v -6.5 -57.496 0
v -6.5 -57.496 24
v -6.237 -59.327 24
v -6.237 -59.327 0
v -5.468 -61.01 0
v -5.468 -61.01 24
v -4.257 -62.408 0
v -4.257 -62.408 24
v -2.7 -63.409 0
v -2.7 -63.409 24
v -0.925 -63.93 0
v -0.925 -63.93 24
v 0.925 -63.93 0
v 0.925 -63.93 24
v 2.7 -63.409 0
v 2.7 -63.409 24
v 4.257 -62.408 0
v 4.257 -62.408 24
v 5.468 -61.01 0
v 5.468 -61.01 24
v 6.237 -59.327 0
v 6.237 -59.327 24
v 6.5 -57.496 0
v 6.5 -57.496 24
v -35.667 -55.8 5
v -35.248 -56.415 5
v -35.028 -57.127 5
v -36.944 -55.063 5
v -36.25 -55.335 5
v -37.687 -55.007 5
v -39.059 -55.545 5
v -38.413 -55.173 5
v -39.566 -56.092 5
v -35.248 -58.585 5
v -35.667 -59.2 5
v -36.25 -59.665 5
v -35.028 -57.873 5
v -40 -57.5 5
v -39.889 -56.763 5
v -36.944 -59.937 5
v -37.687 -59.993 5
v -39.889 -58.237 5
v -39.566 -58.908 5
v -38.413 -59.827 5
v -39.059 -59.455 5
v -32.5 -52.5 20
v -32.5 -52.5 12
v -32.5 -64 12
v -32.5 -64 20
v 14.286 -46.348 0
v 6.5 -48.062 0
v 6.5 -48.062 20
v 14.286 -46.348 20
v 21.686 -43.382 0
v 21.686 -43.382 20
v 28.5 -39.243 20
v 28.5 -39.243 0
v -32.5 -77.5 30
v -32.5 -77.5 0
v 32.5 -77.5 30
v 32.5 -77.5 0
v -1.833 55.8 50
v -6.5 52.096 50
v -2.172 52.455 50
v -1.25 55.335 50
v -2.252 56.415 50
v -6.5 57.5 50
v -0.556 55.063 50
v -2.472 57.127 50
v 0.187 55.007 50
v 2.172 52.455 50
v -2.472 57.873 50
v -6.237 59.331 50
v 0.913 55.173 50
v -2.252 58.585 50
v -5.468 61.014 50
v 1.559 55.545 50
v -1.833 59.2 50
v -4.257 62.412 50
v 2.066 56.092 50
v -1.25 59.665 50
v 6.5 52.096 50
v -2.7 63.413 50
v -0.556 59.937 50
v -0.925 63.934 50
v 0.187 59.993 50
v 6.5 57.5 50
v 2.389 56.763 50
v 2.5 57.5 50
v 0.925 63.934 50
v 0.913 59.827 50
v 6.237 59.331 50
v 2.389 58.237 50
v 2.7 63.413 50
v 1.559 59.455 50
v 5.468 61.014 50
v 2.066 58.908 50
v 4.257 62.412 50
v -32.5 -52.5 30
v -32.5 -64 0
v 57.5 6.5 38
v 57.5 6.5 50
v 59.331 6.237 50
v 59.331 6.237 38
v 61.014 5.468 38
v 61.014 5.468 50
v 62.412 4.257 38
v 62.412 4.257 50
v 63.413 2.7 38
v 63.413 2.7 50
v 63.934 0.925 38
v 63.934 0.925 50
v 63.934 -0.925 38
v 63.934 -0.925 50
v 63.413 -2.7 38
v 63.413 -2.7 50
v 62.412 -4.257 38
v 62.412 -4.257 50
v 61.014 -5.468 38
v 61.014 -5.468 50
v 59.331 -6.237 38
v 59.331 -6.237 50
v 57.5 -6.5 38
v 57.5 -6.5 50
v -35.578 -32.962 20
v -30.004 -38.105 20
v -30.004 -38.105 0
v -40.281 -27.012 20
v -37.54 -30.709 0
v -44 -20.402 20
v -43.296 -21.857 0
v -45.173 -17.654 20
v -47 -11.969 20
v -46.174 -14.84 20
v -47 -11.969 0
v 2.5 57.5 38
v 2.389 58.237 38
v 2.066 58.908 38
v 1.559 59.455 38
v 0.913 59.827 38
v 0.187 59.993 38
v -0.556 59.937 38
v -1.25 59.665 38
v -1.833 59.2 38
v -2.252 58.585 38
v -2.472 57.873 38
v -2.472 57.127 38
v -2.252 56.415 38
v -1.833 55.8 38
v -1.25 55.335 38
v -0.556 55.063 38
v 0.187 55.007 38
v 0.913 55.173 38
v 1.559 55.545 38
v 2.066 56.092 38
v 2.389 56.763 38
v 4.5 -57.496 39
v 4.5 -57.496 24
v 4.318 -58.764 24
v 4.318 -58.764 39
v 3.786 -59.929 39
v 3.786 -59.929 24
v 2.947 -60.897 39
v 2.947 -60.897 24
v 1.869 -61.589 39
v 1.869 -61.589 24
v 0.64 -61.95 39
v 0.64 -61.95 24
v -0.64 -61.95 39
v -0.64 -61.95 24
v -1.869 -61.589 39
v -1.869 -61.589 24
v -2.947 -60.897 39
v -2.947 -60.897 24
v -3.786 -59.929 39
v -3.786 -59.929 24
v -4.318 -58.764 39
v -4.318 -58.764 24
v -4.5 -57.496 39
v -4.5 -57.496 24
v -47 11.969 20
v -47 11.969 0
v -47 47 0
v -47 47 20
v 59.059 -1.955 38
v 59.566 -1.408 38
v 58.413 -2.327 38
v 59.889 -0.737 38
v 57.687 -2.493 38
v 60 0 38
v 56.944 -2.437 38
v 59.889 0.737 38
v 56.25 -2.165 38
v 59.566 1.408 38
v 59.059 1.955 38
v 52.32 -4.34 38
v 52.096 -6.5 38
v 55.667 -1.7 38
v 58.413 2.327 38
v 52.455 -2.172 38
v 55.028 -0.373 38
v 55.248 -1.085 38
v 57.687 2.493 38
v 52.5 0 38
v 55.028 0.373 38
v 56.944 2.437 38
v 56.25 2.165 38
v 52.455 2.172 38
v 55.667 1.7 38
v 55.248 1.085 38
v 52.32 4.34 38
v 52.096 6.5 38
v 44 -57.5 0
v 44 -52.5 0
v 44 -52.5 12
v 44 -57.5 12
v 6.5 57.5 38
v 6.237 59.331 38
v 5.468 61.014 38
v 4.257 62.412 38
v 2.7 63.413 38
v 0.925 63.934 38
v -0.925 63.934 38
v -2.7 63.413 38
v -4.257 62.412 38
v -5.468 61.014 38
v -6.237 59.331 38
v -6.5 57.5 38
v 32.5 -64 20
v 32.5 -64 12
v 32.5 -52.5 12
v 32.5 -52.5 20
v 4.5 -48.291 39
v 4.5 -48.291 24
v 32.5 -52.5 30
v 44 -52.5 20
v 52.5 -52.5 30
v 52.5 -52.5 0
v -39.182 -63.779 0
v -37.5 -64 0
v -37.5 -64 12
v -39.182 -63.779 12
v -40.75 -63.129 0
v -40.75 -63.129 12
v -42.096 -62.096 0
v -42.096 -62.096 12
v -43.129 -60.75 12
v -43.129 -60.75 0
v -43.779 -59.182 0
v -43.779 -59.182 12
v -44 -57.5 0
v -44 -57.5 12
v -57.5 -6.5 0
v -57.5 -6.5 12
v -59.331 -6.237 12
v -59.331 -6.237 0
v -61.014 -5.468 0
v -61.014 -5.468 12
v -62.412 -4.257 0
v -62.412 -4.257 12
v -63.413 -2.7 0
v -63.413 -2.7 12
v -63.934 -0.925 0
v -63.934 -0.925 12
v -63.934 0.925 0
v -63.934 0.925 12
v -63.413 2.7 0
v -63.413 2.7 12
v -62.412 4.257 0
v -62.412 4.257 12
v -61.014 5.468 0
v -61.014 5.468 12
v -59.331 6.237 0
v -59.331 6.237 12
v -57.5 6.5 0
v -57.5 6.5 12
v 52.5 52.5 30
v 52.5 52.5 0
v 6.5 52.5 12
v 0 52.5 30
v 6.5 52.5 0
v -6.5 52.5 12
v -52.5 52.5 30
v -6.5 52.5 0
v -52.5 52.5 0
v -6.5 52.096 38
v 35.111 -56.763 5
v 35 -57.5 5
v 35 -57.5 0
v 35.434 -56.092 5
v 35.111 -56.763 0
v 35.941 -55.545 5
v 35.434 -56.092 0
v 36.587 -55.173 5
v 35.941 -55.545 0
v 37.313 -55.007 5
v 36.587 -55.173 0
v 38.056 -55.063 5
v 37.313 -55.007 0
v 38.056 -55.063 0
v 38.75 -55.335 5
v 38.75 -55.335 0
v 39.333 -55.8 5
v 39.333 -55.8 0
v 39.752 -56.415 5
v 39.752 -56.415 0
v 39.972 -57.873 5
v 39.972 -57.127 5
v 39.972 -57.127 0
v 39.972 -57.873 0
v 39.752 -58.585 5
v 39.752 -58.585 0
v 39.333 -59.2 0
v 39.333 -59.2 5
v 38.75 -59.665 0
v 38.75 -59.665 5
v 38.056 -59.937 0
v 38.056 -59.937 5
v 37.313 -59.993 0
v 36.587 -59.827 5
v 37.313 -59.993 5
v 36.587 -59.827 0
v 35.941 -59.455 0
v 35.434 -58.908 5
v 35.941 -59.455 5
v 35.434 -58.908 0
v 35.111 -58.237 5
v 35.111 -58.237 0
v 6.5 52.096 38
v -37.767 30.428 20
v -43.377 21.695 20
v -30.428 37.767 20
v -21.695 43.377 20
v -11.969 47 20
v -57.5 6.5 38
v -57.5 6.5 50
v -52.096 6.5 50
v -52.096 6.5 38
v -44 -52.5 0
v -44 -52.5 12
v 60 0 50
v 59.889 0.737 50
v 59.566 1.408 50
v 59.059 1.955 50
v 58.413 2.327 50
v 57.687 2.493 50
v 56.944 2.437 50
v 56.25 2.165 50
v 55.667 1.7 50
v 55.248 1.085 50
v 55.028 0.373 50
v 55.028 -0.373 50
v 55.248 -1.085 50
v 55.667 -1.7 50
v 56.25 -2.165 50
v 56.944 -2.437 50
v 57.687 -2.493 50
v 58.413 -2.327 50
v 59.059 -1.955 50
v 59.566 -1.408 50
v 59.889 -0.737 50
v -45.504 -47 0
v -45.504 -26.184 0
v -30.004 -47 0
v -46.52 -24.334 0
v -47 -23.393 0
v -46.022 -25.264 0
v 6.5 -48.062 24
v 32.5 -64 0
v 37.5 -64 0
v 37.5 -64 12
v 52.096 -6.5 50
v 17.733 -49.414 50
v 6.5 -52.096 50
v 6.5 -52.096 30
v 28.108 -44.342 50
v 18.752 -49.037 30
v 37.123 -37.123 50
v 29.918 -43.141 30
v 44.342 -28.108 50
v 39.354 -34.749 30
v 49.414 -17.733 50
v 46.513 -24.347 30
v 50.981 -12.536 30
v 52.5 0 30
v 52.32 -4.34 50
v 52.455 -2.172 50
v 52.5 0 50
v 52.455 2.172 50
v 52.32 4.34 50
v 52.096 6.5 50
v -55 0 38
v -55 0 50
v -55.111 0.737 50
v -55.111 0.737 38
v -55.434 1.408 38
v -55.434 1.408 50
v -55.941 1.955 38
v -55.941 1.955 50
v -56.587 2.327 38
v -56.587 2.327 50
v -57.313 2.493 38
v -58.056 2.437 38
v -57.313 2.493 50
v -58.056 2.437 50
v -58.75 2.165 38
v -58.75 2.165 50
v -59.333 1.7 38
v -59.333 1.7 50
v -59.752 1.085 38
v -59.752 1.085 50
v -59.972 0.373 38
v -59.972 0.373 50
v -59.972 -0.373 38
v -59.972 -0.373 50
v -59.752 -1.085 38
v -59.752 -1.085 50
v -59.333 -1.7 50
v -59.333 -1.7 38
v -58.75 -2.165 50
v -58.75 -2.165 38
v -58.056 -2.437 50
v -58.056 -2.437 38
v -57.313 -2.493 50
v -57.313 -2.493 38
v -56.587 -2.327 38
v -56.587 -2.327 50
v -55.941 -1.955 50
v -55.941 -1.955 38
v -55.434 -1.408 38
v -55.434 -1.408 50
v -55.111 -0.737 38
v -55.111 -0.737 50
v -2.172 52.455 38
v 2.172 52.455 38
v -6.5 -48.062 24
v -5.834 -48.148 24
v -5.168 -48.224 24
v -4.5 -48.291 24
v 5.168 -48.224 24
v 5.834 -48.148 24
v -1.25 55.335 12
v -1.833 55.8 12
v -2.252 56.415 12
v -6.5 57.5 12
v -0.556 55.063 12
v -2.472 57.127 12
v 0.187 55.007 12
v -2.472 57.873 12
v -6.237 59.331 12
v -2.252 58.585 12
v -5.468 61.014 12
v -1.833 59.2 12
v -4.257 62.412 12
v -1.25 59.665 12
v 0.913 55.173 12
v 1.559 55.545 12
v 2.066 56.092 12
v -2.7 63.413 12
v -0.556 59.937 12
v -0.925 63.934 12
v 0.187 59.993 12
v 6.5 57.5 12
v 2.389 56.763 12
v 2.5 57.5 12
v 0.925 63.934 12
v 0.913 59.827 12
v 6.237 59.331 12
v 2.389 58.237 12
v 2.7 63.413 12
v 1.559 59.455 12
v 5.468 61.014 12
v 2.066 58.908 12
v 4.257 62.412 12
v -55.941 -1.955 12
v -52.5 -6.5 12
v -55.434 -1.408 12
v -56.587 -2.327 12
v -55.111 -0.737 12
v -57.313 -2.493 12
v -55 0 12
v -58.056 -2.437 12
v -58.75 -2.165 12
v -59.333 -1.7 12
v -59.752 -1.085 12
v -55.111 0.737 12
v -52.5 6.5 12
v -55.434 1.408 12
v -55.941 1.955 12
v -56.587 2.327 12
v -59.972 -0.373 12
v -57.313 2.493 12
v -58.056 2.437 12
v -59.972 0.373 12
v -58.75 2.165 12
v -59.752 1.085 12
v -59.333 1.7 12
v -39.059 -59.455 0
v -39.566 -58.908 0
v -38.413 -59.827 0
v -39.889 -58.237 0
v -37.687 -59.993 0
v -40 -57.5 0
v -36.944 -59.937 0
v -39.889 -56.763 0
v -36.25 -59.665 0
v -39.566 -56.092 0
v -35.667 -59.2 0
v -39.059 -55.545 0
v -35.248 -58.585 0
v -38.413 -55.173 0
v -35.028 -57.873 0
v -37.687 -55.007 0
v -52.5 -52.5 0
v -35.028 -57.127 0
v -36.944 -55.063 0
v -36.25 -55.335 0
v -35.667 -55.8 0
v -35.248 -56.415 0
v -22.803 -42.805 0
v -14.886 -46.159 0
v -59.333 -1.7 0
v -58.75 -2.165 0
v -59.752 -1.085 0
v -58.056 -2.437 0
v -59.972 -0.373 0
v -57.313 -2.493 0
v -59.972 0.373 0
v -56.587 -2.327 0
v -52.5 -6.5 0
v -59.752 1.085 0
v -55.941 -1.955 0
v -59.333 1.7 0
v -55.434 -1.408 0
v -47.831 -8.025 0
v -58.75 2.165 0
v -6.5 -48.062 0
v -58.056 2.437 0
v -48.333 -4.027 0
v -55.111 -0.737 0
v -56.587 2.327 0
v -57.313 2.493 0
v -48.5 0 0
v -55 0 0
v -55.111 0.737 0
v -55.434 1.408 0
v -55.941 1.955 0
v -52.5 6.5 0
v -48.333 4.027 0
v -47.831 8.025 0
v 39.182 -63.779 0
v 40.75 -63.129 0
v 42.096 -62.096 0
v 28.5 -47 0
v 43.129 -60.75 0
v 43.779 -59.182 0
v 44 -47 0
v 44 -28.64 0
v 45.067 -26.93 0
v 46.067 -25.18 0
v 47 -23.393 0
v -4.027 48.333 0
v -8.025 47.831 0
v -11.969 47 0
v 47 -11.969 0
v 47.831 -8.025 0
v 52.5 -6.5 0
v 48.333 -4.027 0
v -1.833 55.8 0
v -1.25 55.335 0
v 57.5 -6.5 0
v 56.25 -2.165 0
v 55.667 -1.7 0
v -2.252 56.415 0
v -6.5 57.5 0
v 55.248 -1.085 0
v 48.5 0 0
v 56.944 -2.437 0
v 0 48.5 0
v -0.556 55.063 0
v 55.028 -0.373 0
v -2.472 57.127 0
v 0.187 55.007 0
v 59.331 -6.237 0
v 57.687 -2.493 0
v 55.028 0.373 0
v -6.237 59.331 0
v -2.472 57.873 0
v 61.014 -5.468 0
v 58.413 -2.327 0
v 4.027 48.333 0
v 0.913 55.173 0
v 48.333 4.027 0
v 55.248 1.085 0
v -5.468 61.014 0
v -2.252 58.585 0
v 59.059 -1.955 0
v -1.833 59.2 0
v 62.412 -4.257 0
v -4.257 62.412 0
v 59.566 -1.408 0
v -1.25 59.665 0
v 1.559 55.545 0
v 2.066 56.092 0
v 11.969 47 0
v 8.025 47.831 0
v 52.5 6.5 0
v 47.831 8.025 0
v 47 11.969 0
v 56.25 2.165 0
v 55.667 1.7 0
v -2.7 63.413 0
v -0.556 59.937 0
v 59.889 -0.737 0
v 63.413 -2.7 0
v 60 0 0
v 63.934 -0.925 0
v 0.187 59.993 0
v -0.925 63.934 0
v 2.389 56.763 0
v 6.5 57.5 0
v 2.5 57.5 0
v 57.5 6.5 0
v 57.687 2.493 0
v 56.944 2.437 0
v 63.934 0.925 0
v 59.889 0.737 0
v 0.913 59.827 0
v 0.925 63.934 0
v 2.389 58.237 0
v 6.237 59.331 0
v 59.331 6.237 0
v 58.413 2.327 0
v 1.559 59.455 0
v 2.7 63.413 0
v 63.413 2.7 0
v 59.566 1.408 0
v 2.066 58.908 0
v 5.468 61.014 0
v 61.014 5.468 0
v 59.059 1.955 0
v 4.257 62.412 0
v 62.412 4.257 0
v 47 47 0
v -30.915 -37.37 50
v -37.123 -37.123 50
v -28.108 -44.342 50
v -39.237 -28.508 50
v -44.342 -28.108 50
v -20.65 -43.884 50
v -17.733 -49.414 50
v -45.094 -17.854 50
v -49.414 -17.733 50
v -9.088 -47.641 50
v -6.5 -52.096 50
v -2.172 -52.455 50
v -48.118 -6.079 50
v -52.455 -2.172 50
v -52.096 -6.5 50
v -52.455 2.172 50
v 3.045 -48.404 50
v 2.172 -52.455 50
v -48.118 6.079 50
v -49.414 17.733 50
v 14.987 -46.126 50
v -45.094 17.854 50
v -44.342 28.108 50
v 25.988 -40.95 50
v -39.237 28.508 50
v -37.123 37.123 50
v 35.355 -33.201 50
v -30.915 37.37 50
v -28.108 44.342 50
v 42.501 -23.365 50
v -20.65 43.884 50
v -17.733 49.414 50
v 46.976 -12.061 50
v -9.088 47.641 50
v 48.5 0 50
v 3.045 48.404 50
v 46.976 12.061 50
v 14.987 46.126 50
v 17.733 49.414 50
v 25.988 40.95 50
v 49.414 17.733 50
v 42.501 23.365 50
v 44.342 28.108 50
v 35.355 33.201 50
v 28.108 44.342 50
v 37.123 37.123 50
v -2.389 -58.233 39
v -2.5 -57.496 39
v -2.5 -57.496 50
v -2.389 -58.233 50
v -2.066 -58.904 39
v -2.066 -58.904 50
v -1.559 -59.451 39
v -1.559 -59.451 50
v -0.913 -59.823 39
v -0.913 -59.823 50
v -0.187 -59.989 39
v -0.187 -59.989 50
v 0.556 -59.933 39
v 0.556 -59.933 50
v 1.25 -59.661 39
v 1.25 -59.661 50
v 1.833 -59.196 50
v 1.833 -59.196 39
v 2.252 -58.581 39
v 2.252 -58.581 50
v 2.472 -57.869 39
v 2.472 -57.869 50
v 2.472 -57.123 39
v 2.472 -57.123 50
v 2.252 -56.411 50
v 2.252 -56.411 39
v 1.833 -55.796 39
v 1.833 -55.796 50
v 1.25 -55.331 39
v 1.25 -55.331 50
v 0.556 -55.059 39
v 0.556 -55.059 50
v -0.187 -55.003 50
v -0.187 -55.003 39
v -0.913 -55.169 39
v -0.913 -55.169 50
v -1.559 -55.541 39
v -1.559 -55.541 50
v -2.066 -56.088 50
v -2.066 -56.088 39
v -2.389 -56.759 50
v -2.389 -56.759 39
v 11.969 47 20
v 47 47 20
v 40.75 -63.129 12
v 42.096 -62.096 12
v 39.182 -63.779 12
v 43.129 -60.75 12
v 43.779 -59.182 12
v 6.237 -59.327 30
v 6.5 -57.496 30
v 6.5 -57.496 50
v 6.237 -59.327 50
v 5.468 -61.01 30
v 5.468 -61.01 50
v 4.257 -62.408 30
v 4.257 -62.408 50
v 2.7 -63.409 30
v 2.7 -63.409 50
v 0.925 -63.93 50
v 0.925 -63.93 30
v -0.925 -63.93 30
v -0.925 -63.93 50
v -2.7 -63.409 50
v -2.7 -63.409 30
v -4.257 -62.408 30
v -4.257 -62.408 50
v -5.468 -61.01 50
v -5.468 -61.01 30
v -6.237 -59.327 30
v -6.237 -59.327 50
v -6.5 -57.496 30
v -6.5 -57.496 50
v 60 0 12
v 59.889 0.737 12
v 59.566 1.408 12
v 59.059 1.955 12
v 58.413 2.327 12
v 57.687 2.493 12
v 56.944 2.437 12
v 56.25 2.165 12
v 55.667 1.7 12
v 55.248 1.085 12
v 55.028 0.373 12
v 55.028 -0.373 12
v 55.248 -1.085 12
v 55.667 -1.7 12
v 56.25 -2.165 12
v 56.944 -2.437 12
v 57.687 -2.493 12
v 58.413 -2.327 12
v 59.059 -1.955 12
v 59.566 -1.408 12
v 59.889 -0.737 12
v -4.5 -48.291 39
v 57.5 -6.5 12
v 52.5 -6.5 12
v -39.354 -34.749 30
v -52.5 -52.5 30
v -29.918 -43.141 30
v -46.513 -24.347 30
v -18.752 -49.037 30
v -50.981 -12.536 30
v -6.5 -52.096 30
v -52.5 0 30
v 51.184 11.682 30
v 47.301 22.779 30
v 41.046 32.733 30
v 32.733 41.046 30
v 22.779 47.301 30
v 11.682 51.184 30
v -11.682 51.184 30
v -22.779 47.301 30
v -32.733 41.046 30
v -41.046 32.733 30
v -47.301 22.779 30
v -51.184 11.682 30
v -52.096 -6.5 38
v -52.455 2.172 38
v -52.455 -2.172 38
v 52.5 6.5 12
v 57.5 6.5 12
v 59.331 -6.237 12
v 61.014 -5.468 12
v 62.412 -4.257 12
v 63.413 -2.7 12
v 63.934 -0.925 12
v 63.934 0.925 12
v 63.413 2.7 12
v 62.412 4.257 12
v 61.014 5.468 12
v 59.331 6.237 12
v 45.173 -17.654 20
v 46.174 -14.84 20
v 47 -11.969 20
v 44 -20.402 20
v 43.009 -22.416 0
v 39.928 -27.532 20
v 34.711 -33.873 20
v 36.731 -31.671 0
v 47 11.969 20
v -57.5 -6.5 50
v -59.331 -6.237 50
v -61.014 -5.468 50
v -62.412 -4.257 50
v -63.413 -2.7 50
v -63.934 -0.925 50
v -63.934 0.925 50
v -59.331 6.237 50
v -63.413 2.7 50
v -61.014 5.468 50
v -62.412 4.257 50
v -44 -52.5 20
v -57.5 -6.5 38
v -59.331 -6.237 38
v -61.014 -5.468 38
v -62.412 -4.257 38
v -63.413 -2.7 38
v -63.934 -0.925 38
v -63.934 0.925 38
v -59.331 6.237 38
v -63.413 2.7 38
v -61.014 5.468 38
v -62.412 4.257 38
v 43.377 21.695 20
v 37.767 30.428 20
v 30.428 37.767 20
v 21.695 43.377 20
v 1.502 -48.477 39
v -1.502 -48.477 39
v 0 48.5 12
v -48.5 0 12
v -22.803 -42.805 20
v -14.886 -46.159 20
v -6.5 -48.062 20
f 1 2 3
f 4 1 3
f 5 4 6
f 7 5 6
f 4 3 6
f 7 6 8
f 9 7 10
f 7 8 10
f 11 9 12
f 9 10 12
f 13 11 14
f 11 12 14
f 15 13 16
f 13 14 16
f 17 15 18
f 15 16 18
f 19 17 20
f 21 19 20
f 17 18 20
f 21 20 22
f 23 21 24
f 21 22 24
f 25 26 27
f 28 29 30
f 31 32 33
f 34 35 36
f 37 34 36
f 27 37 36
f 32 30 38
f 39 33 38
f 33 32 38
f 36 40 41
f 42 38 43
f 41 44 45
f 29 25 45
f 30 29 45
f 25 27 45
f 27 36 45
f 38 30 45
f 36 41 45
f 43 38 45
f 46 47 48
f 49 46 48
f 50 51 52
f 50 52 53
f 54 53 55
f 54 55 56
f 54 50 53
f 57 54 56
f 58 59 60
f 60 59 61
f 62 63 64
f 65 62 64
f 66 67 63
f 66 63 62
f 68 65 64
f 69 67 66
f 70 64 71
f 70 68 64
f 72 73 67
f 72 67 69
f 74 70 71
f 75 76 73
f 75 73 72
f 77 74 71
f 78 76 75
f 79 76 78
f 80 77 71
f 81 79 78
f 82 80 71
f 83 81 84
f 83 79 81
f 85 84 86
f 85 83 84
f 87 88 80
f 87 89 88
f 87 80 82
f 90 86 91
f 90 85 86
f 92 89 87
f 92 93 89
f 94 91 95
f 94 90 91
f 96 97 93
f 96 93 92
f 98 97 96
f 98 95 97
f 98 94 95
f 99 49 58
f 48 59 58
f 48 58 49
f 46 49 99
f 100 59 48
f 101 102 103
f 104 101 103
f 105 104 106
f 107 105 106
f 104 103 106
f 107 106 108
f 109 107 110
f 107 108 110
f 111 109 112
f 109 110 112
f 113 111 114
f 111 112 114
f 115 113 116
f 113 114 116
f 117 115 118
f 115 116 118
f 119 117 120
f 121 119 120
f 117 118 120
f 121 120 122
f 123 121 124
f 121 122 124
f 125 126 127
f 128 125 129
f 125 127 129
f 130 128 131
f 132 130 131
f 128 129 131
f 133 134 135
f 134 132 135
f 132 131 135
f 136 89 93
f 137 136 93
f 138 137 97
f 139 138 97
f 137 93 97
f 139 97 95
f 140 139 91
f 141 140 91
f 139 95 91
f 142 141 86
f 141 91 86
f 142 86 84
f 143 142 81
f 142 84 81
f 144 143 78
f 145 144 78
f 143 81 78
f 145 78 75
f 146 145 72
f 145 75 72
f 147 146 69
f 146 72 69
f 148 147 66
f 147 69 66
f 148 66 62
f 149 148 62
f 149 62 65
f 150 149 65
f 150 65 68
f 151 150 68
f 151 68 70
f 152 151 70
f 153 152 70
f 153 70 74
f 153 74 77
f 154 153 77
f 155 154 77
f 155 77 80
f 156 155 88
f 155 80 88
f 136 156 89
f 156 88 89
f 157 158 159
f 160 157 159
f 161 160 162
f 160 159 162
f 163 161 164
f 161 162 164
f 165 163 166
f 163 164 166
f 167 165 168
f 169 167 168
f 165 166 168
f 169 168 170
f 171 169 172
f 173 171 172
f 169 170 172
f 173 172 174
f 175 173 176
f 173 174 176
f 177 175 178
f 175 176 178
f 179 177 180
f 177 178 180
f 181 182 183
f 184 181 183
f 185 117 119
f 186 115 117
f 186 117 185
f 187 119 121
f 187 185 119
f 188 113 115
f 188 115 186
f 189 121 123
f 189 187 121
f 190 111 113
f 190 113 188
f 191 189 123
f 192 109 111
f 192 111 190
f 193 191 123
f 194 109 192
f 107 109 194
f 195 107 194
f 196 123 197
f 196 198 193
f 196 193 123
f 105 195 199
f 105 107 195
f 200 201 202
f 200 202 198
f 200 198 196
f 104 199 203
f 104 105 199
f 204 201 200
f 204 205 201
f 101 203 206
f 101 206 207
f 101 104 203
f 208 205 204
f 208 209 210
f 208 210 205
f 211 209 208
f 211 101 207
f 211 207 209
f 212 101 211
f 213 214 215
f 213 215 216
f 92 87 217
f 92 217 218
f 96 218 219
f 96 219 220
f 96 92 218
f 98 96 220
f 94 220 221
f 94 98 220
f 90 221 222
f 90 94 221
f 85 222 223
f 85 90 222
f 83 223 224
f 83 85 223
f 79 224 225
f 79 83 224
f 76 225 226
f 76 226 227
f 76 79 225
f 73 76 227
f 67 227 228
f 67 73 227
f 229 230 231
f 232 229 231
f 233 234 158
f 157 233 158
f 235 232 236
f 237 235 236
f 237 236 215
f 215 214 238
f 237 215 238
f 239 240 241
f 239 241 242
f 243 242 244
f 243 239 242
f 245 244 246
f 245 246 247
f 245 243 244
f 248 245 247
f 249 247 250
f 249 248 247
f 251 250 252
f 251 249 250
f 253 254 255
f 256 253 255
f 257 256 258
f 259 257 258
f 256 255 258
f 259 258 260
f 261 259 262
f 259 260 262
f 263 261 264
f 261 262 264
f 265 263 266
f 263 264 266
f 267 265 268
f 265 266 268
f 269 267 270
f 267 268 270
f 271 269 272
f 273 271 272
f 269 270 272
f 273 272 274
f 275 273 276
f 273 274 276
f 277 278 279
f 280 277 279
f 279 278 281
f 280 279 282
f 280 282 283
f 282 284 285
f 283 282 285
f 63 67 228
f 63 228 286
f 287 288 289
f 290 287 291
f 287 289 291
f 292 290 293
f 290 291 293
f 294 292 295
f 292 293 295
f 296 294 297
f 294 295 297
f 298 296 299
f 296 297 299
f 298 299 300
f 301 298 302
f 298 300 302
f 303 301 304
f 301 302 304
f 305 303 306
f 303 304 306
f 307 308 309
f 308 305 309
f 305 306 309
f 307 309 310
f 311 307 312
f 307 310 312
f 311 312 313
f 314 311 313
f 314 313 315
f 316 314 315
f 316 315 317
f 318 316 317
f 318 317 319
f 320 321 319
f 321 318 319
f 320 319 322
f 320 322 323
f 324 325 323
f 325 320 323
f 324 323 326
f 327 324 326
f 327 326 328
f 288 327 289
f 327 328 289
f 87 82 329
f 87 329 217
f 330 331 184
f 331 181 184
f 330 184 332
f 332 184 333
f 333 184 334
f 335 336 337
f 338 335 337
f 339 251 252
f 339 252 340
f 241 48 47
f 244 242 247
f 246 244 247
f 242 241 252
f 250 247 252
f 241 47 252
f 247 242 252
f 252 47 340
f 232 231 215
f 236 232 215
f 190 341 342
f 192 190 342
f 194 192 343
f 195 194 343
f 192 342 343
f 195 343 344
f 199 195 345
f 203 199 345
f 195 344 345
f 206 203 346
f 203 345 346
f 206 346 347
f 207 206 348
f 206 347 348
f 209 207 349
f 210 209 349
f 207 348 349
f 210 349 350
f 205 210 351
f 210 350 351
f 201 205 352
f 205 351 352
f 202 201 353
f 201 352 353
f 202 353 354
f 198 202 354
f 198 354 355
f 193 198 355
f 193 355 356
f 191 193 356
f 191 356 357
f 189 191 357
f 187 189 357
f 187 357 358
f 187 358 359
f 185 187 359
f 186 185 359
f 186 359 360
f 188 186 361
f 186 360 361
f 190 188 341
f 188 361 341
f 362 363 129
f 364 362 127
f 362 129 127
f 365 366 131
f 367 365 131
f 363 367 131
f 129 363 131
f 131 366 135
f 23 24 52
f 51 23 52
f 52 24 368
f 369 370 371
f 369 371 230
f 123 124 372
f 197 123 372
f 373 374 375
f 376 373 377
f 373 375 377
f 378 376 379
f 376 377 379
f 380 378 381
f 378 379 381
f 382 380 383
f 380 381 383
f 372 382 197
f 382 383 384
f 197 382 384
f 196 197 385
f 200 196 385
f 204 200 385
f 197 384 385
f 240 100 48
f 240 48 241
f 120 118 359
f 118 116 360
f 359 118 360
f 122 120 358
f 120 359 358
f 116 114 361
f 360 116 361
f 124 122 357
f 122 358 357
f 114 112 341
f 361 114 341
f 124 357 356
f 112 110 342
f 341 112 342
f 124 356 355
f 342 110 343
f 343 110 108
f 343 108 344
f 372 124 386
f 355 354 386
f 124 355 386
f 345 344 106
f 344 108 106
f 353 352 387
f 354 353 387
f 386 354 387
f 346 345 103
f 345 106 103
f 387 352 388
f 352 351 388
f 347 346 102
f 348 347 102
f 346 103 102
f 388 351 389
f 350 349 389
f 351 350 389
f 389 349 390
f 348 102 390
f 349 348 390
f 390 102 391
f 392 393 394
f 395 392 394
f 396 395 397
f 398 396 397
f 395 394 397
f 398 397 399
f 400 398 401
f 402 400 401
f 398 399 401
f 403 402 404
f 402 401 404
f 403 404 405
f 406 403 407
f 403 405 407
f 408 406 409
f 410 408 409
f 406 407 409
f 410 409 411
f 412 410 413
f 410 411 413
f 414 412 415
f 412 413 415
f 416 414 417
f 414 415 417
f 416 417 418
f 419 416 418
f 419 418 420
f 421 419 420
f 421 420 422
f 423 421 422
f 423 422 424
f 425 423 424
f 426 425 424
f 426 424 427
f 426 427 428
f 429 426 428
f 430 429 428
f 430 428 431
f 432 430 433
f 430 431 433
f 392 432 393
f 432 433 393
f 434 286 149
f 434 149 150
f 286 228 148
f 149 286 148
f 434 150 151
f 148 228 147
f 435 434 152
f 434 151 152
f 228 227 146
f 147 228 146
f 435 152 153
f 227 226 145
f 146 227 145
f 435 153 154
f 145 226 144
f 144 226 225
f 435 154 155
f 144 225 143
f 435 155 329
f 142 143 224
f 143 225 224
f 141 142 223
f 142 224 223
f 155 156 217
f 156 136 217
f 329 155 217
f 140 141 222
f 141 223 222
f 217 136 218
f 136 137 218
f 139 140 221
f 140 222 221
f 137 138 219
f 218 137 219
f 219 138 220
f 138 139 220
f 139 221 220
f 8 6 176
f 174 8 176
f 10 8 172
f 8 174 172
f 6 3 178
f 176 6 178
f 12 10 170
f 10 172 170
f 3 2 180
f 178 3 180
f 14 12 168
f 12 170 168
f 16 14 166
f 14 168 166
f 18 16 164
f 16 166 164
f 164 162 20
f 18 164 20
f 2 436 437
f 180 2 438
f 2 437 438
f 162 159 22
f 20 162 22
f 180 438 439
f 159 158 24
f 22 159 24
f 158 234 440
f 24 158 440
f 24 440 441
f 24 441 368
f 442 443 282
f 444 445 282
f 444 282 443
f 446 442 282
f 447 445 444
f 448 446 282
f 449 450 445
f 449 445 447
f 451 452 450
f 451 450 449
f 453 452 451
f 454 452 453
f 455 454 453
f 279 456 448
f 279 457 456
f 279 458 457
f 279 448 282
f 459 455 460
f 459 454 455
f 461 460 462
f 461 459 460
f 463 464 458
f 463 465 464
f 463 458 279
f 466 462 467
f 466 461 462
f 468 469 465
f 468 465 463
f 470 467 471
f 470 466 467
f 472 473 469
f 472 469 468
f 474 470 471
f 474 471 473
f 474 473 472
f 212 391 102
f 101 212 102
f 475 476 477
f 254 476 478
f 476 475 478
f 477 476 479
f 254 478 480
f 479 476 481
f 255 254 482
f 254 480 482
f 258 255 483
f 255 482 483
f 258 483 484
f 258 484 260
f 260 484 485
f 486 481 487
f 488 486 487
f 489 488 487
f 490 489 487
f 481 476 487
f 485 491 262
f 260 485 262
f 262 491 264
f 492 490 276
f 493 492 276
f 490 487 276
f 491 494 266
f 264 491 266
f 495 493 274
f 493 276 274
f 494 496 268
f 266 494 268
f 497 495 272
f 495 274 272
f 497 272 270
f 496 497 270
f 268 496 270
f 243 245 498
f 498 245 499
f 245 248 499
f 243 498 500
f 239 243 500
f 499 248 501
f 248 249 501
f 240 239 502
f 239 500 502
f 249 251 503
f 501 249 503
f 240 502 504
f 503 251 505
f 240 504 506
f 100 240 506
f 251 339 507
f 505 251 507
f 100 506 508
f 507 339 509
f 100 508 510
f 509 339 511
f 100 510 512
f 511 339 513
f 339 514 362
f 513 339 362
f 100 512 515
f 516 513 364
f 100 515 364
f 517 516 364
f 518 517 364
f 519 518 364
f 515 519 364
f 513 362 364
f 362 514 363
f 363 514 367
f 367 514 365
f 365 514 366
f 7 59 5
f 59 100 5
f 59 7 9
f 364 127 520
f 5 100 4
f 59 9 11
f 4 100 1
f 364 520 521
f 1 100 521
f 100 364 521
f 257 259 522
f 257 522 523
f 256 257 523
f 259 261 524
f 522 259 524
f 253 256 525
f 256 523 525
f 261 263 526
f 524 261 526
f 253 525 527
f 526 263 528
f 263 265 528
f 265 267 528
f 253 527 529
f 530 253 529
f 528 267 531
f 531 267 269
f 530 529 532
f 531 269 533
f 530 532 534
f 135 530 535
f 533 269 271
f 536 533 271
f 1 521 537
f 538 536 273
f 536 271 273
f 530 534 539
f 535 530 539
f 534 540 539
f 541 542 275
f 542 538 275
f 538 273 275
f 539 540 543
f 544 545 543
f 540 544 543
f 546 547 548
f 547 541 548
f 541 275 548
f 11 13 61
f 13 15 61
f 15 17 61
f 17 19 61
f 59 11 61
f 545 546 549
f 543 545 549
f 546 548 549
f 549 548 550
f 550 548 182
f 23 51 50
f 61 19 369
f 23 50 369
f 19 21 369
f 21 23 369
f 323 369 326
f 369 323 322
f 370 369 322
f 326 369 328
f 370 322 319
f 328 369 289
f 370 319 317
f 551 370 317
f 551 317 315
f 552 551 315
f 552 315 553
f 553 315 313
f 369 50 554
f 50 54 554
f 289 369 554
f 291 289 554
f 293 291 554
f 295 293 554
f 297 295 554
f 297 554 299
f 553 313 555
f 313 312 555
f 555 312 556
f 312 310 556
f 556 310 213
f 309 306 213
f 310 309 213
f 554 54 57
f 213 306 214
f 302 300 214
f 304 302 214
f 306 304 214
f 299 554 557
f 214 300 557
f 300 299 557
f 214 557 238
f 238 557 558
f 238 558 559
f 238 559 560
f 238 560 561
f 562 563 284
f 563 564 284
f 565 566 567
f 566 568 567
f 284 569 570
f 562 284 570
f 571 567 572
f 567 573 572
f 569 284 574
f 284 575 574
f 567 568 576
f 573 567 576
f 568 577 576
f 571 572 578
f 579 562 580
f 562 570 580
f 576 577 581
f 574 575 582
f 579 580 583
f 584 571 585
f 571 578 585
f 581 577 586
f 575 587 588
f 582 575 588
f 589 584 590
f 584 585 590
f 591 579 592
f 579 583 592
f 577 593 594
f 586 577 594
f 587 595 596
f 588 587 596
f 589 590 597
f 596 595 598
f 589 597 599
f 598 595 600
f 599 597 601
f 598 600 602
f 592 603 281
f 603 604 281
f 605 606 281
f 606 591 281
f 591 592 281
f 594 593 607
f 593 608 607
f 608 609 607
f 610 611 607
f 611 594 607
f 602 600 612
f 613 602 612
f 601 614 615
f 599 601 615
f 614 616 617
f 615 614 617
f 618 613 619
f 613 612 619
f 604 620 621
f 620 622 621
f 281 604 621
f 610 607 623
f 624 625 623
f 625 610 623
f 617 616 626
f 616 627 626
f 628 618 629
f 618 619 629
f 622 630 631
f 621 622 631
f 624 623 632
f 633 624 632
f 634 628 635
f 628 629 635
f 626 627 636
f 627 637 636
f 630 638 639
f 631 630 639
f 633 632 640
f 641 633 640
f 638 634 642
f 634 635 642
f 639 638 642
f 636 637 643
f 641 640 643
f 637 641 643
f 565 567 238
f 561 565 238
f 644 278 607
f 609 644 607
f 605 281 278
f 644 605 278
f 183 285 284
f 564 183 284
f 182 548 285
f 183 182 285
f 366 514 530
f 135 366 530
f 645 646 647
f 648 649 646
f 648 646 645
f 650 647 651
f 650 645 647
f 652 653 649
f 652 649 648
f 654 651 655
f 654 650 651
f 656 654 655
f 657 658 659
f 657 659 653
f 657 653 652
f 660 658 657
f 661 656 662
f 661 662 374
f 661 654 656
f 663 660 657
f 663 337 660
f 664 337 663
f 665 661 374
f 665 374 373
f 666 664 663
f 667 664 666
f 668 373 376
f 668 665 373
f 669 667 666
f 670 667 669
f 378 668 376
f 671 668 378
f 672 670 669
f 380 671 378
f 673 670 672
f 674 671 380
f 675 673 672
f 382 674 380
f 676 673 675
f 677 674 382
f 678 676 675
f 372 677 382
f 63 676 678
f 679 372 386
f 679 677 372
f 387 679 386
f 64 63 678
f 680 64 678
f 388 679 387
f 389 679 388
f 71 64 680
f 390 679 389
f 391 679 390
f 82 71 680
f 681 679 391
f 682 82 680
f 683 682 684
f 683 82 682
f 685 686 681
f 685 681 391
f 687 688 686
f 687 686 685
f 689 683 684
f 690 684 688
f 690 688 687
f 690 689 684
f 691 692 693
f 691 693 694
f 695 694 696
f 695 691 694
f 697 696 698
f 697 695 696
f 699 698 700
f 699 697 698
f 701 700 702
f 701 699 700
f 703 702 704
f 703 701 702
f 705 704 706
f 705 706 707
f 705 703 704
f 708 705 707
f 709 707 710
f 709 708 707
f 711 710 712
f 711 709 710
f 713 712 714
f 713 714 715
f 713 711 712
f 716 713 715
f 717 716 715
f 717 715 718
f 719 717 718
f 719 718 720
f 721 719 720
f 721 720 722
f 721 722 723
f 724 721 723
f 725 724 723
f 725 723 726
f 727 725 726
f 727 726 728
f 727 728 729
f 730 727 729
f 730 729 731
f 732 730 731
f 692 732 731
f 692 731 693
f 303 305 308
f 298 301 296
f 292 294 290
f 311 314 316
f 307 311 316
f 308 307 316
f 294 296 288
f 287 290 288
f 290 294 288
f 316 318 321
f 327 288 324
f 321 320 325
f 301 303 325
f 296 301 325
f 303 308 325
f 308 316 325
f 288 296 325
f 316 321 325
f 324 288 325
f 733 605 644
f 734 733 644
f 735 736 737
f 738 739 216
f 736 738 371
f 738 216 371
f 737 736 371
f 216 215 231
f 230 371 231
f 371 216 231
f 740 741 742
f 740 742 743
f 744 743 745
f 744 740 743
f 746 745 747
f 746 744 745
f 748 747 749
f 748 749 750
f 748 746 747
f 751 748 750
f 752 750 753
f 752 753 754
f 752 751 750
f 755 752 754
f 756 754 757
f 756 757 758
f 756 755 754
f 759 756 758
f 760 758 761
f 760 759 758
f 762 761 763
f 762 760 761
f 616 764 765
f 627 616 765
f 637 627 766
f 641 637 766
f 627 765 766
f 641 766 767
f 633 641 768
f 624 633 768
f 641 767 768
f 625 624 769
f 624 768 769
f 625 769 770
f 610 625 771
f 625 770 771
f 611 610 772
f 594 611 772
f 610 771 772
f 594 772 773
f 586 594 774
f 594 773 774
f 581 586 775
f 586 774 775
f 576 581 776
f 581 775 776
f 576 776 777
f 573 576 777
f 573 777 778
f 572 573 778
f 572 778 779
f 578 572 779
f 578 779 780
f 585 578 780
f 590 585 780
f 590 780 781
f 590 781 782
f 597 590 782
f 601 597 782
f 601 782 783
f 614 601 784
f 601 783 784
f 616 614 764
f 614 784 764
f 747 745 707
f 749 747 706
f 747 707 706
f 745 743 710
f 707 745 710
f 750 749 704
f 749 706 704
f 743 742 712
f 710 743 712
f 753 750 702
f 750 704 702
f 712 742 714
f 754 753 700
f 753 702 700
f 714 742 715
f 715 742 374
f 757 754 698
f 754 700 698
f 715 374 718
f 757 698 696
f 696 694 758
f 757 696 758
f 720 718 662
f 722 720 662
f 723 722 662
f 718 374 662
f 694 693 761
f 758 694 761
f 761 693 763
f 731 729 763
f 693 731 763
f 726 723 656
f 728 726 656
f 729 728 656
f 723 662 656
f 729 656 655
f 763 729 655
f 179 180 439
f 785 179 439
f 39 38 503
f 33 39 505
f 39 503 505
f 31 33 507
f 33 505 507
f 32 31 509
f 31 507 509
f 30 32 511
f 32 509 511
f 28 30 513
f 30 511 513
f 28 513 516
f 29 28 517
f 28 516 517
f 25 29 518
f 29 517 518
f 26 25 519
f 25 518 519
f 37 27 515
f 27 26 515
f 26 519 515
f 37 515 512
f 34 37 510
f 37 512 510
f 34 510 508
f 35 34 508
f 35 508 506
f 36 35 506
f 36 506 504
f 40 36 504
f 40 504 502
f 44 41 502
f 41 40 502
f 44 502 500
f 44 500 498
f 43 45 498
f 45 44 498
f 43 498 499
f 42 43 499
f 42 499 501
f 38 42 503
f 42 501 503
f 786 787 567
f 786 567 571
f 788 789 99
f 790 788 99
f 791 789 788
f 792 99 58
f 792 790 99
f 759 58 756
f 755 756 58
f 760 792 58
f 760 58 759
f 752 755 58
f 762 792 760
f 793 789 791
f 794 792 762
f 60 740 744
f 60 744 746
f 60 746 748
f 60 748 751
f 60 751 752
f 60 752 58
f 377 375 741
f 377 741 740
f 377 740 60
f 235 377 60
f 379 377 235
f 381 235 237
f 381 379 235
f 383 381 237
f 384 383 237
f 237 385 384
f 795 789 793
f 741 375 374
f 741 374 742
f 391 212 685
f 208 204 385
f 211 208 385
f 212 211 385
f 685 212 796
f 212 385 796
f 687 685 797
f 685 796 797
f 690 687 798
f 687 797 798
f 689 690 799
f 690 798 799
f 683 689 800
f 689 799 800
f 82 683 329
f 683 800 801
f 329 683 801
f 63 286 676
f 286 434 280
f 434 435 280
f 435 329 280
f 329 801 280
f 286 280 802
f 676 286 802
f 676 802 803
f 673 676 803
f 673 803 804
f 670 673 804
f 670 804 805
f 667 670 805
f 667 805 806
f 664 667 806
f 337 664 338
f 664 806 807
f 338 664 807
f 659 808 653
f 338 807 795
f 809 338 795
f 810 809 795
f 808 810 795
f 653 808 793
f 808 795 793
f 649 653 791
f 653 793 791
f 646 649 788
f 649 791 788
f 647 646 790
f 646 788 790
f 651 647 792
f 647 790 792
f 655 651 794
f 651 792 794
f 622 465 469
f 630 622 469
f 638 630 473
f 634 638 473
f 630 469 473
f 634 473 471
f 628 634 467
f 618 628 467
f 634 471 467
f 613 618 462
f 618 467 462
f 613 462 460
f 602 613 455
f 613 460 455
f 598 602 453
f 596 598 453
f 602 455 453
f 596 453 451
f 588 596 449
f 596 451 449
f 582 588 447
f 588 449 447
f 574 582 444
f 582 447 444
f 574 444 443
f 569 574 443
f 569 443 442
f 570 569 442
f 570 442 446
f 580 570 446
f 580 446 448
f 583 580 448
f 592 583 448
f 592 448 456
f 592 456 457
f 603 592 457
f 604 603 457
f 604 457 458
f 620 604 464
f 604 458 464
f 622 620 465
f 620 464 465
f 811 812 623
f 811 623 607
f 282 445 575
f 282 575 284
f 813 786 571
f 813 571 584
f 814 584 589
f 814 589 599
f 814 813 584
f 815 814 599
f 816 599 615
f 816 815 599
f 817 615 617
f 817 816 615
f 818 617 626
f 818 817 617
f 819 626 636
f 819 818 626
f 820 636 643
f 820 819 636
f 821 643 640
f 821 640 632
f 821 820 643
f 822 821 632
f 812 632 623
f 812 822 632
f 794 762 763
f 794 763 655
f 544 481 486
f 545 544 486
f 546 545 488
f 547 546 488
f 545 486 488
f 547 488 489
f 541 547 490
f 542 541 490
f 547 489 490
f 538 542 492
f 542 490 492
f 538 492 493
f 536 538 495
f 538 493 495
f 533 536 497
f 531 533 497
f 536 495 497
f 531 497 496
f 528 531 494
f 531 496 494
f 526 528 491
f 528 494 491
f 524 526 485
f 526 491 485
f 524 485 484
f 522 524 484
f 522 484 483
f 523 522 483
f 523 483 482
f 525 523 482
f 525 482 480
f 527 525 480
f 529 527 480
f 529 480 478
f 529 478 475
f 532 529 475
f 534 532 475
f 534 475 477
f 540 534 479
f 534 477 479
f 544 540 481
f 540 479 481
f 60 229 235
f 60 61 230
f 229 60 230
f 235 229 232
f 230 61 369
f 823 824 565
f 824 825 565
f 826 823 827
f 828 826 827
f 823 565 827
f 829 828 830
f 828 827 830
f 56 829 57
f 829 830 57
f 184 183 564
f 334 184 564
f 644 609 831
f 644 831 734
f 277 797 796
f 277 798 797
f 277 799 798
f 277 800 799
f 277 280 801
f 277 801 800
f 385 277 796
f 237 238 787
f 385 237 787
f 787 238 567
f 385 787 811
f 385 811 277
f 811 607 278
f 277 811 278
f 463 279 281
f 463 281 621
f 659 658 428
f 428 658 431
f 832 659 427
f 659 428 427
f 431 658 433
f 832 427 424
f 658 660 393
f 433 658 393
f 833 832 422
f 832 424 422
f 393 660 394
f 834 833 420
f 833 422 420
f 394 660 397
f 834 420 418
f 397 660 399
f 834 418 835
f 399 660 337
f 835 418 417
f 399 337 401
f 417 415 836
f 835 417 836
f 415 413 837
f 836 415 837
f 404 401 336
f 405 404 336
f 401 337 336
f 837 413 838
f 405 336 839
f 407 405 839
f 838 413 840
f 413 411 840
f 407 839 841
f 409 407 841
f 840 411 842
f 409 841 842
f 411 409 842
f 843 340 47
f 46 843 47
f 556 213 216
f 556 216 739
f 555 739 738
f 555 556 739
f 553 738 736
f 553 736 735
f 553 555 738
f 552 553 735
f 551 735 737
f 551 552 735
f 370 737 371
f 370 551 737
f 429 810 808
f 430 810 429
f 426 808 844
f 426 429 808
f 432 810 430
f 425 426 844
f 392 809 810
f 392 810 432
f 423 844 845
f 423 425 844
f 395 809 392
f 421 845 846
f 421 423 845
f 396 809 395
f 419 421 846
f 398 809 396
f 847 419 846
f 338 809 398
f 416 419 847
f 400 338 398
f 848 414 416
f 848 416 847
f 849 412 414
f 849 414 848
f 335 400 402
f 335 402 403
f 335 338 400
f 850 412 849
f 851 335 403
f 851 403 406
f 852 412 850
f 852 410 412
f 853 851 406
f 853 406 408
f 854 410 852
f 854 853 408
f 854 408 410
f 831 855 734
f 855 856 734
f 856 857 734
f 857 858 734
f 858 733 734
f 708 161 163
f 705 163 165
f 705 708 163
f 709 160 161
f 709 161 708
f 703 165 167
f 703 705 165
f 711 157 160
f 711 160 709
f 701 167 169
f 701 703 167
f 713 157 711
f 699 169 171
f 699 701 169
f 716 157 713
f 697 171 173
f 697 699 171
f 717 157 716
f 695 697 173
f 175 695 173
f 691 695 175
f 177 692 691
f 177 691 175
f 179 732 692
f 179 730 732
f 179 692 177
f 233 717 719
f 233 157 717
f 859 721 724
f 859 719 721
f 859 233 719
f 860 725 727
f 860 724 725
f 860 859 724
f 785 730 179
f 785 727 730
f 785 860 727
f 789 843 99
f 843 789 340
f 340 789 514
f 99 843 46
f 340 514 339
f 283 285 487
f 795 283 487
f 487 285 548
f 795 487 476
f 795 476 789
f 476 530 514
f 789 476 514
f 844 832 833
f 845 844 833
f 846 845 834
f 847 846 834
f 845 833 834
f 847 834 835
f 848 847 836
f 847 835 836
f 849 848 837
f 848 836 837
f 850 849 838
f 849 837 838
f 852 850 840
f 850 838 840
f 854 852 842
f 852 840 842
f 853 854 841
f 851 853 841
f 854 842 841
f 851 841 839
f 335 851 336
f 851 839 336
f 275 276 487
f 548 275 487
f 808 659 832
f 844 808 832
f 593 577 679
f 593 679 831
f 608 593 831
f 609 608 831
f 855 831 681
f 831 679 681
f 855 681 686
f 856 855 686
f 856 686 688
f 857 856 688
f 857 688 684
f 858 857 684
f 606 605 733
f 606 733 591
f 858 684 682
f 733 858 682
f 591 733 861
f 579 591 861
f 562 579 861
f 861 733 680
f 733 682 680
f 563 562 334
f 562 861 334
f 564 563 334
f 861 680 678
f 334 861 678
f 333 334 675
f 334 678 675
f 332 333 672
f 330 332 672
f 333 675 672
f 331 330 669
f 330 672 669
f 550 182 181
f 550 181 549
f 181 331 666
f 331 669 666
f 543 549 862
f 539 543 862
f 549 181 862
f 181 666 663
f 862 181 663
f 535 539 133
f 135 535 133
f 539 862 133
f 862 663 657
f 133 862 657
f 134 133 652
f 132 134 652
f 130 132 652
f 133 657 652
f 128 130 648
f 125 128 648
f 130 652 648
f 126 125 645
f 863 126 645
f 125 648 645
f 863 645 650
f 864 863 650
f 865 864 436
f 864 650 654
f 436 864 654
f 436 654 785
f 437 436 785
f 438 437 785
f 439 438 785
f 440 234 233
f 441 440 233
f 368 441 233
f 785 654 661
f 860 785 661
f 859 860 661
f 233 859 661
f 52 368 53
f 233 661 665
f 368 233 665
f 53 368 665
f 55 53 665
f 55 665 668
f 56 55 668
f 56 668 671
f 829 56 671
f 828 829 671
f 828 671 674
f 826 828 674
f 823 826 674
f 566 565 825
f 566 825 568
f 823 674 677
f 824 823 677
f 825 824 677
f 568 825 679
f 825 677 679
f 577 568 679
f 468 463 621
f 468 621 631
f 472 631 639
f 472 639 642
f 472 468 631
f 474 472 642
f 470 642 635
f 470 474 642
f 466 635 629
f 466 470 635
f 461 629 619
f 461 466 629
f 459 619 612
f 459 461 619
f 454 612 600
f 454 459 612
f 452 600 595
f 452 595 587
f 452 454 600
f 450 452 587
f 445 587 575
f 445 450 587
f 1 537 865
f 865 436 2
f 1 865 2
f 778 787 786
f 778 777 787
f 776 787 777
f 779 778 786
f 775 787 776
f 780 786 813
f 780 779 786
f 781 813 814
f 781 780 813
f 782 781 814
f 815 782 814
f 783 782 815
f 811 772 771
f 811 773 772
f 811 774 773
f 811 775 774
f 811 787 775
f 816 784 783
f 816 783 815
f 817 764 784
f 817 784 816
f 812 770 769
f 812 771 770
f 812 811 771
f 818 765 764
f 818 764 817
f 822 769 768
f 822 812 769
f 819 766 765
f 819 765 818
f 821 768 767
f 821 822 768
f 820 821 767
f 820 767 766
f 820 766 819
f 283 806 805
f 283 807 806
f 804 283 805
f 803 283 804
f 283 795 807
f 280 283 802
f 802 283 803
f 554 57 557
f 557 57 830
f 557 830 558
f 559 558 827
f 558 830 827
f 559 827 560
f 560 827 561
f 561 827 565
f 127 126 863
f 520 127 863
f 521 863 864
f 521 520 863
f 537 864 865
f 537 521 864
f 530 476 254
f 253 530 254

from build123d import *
from build123d.topology import SkipClean

# Parameters (mm, degrees)
SKETCH1_W                = 105
SKETCH1_H                = 105
SKETCH1_W_2              = 94
SKETCH1_H_2              = 94
SKETCH1_W_3              = 65
SKETCH1_H_3              = 25
BOSS_EXTRUDE1_DEPTH      = 20
SKETCH2_W                = 65
SKETCH2_H                = 25
SKETCH2_W_2              = 94
SKETCH2_H_2              = 94
BOSS_EXTRUDE2_DEPTH      = 10
SKETCH3_W                = 57
SKETCH3_H                = 26.5
CUT_EXTRUDE1_DEPTH       = 20
SKETCH5_R                = 52.5
BOSS_EXTRUDE4_DEPTH      = 20
SKETCH8_R                = 48.5
CUT_EXTRUDE3_DEPTH       = 107.124926384
BOSS_EXTRUDE5_START      = -38
SKETCH9_R                = 2.5
BOSS_EXTRUDE5_DEPTH      = 12
SKETCH4_R                = 2.5
BOSS_EXTRUDE6_DEPTH      = 20
SKETCH10_W               = 15.5
SKETCH10_H               = 26.597794237
CUT_EXTRUDE4_DEPTH       = 20
BOSS_EXTRUDE8_START      = -45
SKETCH11_R               = 2.5
BOSS_EXTRUDE8_DEPTH      = 15
BOSS_EXTRUDE7_DEPTH      = 20
SKETCH16_R               = 2.5
BOSS_EXTRUDE9_DEPTH      = 30
CUT_EXTRUDE5_START       = -8
CUT_EXTRUDE5_DEPTH       = 8
SKETCH18_R               = 2.5
BOSS_EXTRUDE10_DEPTH     = 12
CUT_EXTRUDE12_DEPTH      = 18
CUT_EXTRUDE12_DEPTH_BACK = 24
CUT_EXTRUDE13_DEPTH      = 15


# Read off the part's stored shape, not the designer's step: Boss-Extrude7
with BuildPart() as part:
    # Sketch1 → Boss-Extrude1 (new body)
    # profile 1 of 2: a face of its own
    with BuildSketch(Plane.XY):
        Rectangle(SKETCH1_W, SKETCH1_H)
        Rectangle(SKETCH1_W_2, SKETCH1_H_2, mode=Mode.SUBTRACT)
    # profile 2 of 2: a face of its own
    with BuildSketch(Plane.XY):
        with Locations((0, -65)):
            Rectangle(SKETCH1_W_3, SKETCH1_H_3)
    extrude(amount=BOSS_EXTRUDE1_DEPTH)

    # Sketch2 → Boss-Extrude2 (add)
    # profile 1 of 3: a face of its own
    with BuildSketch(Plane.XY.offset(20)):
        with Locations((0, -65)):
            Rectangle(SKETCH2_W, SKETCH2_H)
    # profile 2 of 3: a face of its own
    with BuildSketch(Plane.XY.offset(20)):
        Polygon((52.5, 52.5), (-52.5, 52.5), (-52.5, -52.5), (-32.5, -52.5), (32.5, -52.5), (52.5, -52.5), align=None)
        Rectangle(SKETCH2_W_2, SKETCH2_H_2, mode=Mode.SUBTRACT)
    # profile 3 of 3: a face of its own
    with BuildSketch(Plane.XY.offset(20)):
        Rectangle(SKETCH2_W_2, SKETCH2_H_2)
    extrude(amount=BOSS_EXTRUDE2_DEPTH)

    # Sketch3 → Cut-Extrude1 (cut)
    with BuildSketch(Plane(origin=(0, 0, 0), x_dir=(-1, 0, 0), z_dir=(0, 0, -1))):
        with Locations((0, -60.25)):
            Rectangle(SKETCH3_W, SKETCH3_H)
    extrude(amount=-CUT_EXTRUDE1_DEPTH, mode=Mode.SUBTRACT)

    # Sketch5 → Boss-Extrude4 (add)
    with BuildSketch(Plane.XY.offset(30)):
        Circle(SKETCH5_R)
    extrude(amount=BOSS_EXTRUDE4_DEPTH)

    # Sketch8 → Cut-Extrude3 (cut, through all)
    with BuildSketch(Plane.XY.offset(50)):
        Circle(SKETCH8_R)
    extrude(amount=-CUT_EXTRUDE3_DEPTH, mode=Mode.SUBTRACT)

    # Sketch9 → Boss-Extrude5 (add)
    # profile 1 of 3: a face of its own
    with BuildSketch(Plane.XY.offset(50).offset(BOSS_EXTRUDE5_START)):
        with BuildLine():
            Line((57.5, 6.5), (48.5, 6.5))
            Line((48.5, 6.5), (48.5, -6.5))
            Line((48.5, -6.5), (57.5, -6.5))
            ThreePointArc((57.5, -6.5), (64, 0), (57.5, 6.5))
        make_face()
        with Locations((57.5, 0)):
            Circle(SKETCH9_R, mode=Mode.SUBTRACT)
    # profile 2 of 3: a face of its own
    with BuildSketch(Plane.XY.offset(50).offset(BOSS_EXTRUDE5_START)):
        with BuildLine():
            Line((-57.5, 6.5), (-48.5, 6.5))
            Line((-48.5, 6.5), (-48.5, -6.5))
            Line((-48.5, -6.5), (-57.5, -6.5))
            ThreePointArc((-57.5, -6.5), (-64, 0), (-57.5, 6.5))
        make_face()
        with Locations((-57.5, 0)):
            Circle(SKETCH9_R, mode=Mode.SUBTRACT)
    # profile 3 of 3: a face of its own
    with BuildSketch(Plane.XY.offset(50).offset(BOSS_EXTRUDE5_START)):
        with BuildLine():
            Line((-6.5, 57.5), (-6.5, 48.5))
            Line((-6.5, 48.5), (6.5, 48.5))
            Line((6.5, 48.5), (6.5, 57.5))
            ThreePointArc((6.5, 57.5), (0, 64), (-6.5, 57.5))
        make_face()
        with Locations((0, 57.5)):
            Circle(SKETCH9_R, mode=Mode.SUBTRACT)
    extrude(amount=-BOSS_EXTRUDE5_DEPTH)

    # Sketch4 → Boss-Extrude6 (add)
    with BuildSketch(Plane(origin=(0, 0, 0), x_dir=(-1, 0, 0), z_dir=(0, 0, -1))):
        with BuildLine():
            Line((-32.5, -64), (-32.5, -77.5))
            Line((-32.5, -77.5), (32.5, -77.5))
            Line((32.5, -77.5), (32.5, -64))
            Line((32.5, -64), (37.5, -64))
            ThreePointArc((37.5, -64), (42.096194078, -62.096194078), (44, -57.5))
            Line((44, -57.5), (44, -52.5))
            Line((44, -52.5), (52.5, -52.5))
            Line((52.5, -52.5), (52.021296507, -7.073521736))
            ThreePointArc((52.021296507, -7.073521736), (49.206713639, -18.301621043), (44, -28.640006983))
            Line((44, -28.640006983), (44, -20.402205763))
            ThreePointArc((44, -20.402205763), (0, -48.5), (-44, -20.402205763))
            Line((-44, -20.402205763), (-44, -28.640006983))
            ThreePointArc((-44, -28.640006983), (-50.330159944, -14.937369246), (-52.5, 0))
            Line((-52.5, 0), (-52.5, -52.5))
            Line((-52.5, -52.5), (-44, -52.5))
            Line((-44, -52.5), (-44, -57.5))
            ThreePointArc((-44, -57.5), (-42.096194078, -62.096194078), (-37.5, -64))
            Line((-37.5, -64), (-32.5, -64))
        make_face()
        with Locations((-37.5, -57.5)):
            Circle(SKETCH4_R, mode=Mode.SUBTRACT)
        with Locations((37.5, -57.5)):
            Circle(SKETCH4_R, mode=Mode.SUBTRACT)
    extrude(amount=-BOSS_EXTRUDE6_DEPTH)

    # Sketch10 → Cut-Extrude4 (cut)
    with BuildSketch(Plane(origin=(0, 0, 0), x_dir=(-1, 0, 0), z_dir=(0, 0, -1))):
        with Locations((-36.25, -33.701102881)):
            Rectangle(SKETCH10_W, SKETCH10_H)
        with Locations((37.754368076, -33.701102881)):
            Rectangle(SKETCH10_W, SKETCH10_H)
    extrude(amount=-CUT_EXTRUDE4_DEPTH, mode=Mode.SUBTRACT)

    # Sketch11 → Boss-Extrude8 (add)
    with BuildSketch(Plane.XY.offset(50).offset(BOSS_EXTRUDE8_START)):
        with Locations(Location((-37.5, -57.5, 0), (0, 0, 180))):
            Circle(SKETCH11_R)
        with Locations(Location((37.5, -57.5, 0), (0, 0, 180))):
            Circle(SKETCH11_R)
    extrude(amount=BOSS_EXTRUDE8_DEPTH)

    # Boss-Extrude7 outline → Boss-Extrude7 (add)
    with SkipClean():  # the faces are left unmerged after this step: merging them gives an invalid solid
        with BuildSketch(Plane.XY):
            with BuildLine():
                ThreePointArc((-30.004368076, -38.104958947), (-40.659489217, -26.439665971), (-47, -11.968709204))
                Line((-47, -11.968709204), (-47, -23.393375131))
                ThreePointArc((-47, -23.393375131), (-46.273225972, -24.79997093), (-45.504368076, -26.18401203))
                Line((-45.504368076, -26.18401203), (-45.504368076, -47))
                Line((-45.504368076, -47), (-30.004368076, -47))
                Line((-30.004368076, -47), (-30.004368076, -38.104958947))
            make_face()
            with BuildLine():
                Line((47, -23.393375131), (47, -11.968709204))
                ThreePointArc((47, -11.968709204), (40.137662704, -27.225319699), (28.5, -39.242833741))
                Line((28.5, -39.242833741), (28.5, -47))
                Line((28.5, -47), (44, -47))
                Line((44, -47), (44, -28.640006983))
                ThreePointArc((44, -28.640006983), (45.575561285, -26.059896653), (47, -23.393375131))
            make_face()
        extrude(amount=BOSS_EXTRUDE7_DEPTH)

    # Sketch16 → Boss-Extrude9 (add)
    with SkipClean():  # the faces are left unmerged after this step: merging them gives an invalid solid
        with BuildSketch(Plane.XY.offset(20)):
            with BuildLine():
                Line((-6.5, -57.496065111), (-6.5, -52.096065111))
                ThreePointArc((-6.5, -52.096065111), (0, -52.5), (6.5, -52.096065111))
                Line((6.5, -52.096065111), (6.5, -57.496065111))
                ThreePointArc((6.5, -57.496065111), (0, -63.996065111), (-6.5, -57.496065111))
            make_face()
            with Locations(Location((0, -57.496065111, 0), (0, 0, 180))):
                Circle(SKETCH16_R, mode=Mode.SUBTRACT)
        extrude(amount=BOSS_EXTRUDE9_DEPTH)

    # Sketch17 → Cut-Extrude5 (cut)
    with SkipClean():  # the faces are left unmerged after this step: merging them gives an invalid solid
        with BuildSketch(Plane.XY.offset(20).offset(CUT_EXTRUDE5_START)):
            with BuildLine():
                Line((32.5, -64), (32.5, -52.5))
                Line((32.5, -52.5), (44, -52.5))
                Line((44, -52.5), (44, -57.5))
                ThreePointArc((44, -57.5), (42.096194078, -62.096194078), (37.5, -64))
                Line((37.5, -64), (32.5, -64))
            make_face()
            with BuildLine():
                Line((-44, -52.5), (-32.5, -52.5))
                Line((-32.5, -52.5), (-32.5, -64))
                Line((-32.5, -64), (-37.5, -64))
                ThreePointArc((-37.5, -64), (-42.096194078, -62.096194078), (-44, -57.5))
                Line((-44, -57.5), (-44, -52.5))
            make_face()
        extrude(amount=CUT_EXTRUDE5_DEPTH, mode=Mode.SUBTRACT)

    # Sketch18 → Boss-Extrude10 (add)
    # profile 1 of 3: a face of its own
    with SkipClean():  # the faces are left unmerged after this step: merging them gives an invalid solid
        with BuildSketch(Plane.XY.offset(50)):
            with BuildLine():
                Line((-57.5, 6.5), (-52.096065111, 6.5))
                ThreePointArc((-52.096065111, 6.5), (-52.5, 0), (-52.096065111, -6.5))
                Line((-52.096065111, -6.5), (-57.5, -6.5))
                ThreePointArc((-57.5, -6.5), (-64, 0), (-57.5, 6.5))
            make_face()
            with Locations((-57.5, 0)):
                Circle(SKETCH18_R, mode=Mode.SUBTRACT)
        # profile 2 of 3: a face of its own
        with BuildSketch(Plane.XY.offset(50)):
            with BuildLine():
                Line((52.096065111, 6.5), (57.5, 6.5))
                ThreePointArc((57.5, 6.5), (64, 0), (57.5, -6.5))
                Line((57.5, -6.5), (52.096065111, -6.5))
                ThreePointArc((52.096065111, -6.5), (52.5, 0), (52.096065111, 6.5))
            make_face()
            with Locations((57.5, 0)):
                Circle(SKETCH18_R, mode=Mode.SUBTRACT)
        # profile 3 of 3: a face of its own
        with BuildSketch(Plane.XY.offset(50)):
            with BuildLine():
                Line((-6.5, 57.5), (-6.5, 52.096065111))
                ThreePointArc((-6.5, 52.096065111), (0, 52.5), (6.5, 52.096065111))
                Line((6.5, 52.096065111), (6.5, 57.5))
                ThreePointArc((6.5, 57.5), (0, 64), (-6.5, 57.5))
            make_face()
            with Locations((0, 57.5)):
                Circle(SKETCH18_R, mode=Mode.SUBTRACT)
        extrude(amount=-BOSS_EXTRUDE10_DEPTH)

    # Sketch19 → Cut-Extrude12 (cut, two sides: drawn at the far end of the back side and taken through both)
    with SkipClean():  # the faces are left unmerged after this step: merging them gives an invalid solid
        with BuildSketch(Plane(origin=(0, 0, 0), x_dir=(-1, 0, 0), z_dir=(0, 0, -1)).offset(-CUT_EXTRUDE12_DEPTH_BACK)):
            with BuildLine():
                Line((-6.5, -57.496065111), (-6.5, -46.382922992))
                ThreePointArc((-6.5, -46.382922992), (0, -46.836156389), (6.5, -46.382922992))
                Line((6.5, -46.382922992), (6.5, -57.496065111))
                ThreePointArc((6.5, -57.496065111), (0, -63.996065111), (-6.5, -57.496065111))
            make_face()
        extrude(amount=CUT_EXTRUDE12_DEPTH + CUT_EXTRUDE12_DEPTH_BACK, mode=Mode.SUBTRACT)

    # Sketch20 → Cut-Extrude13 (cut)
    with SkipClean():  # the faces are left unmerged after this step: merging them gives an invalid solid
        with BuildSketch(Plane(origin=(0, 0, 24), x_dir=(-1, 0, 0), z_dir=(0, 0, -1))):
            with BuildLine():
                Line((4.5, -57.496065111), (4.5, -48.290785871))
                ThreePointArc((4.5, -48.290785871), (0, -48.5), (-4.5, -48.290785871))
                Line((-4.5, -48.290785871), (-4.5, -57.496065111))
                ThreePointArc((-4.5, -57.496065111), (0, -61.996065111), (4.5, -57.496065111))
            make_face()
        extrude(amount=-CUT_EXTRUDE13_DEPTH, mode=Mode.SUBTRACT)


solid = part.part
